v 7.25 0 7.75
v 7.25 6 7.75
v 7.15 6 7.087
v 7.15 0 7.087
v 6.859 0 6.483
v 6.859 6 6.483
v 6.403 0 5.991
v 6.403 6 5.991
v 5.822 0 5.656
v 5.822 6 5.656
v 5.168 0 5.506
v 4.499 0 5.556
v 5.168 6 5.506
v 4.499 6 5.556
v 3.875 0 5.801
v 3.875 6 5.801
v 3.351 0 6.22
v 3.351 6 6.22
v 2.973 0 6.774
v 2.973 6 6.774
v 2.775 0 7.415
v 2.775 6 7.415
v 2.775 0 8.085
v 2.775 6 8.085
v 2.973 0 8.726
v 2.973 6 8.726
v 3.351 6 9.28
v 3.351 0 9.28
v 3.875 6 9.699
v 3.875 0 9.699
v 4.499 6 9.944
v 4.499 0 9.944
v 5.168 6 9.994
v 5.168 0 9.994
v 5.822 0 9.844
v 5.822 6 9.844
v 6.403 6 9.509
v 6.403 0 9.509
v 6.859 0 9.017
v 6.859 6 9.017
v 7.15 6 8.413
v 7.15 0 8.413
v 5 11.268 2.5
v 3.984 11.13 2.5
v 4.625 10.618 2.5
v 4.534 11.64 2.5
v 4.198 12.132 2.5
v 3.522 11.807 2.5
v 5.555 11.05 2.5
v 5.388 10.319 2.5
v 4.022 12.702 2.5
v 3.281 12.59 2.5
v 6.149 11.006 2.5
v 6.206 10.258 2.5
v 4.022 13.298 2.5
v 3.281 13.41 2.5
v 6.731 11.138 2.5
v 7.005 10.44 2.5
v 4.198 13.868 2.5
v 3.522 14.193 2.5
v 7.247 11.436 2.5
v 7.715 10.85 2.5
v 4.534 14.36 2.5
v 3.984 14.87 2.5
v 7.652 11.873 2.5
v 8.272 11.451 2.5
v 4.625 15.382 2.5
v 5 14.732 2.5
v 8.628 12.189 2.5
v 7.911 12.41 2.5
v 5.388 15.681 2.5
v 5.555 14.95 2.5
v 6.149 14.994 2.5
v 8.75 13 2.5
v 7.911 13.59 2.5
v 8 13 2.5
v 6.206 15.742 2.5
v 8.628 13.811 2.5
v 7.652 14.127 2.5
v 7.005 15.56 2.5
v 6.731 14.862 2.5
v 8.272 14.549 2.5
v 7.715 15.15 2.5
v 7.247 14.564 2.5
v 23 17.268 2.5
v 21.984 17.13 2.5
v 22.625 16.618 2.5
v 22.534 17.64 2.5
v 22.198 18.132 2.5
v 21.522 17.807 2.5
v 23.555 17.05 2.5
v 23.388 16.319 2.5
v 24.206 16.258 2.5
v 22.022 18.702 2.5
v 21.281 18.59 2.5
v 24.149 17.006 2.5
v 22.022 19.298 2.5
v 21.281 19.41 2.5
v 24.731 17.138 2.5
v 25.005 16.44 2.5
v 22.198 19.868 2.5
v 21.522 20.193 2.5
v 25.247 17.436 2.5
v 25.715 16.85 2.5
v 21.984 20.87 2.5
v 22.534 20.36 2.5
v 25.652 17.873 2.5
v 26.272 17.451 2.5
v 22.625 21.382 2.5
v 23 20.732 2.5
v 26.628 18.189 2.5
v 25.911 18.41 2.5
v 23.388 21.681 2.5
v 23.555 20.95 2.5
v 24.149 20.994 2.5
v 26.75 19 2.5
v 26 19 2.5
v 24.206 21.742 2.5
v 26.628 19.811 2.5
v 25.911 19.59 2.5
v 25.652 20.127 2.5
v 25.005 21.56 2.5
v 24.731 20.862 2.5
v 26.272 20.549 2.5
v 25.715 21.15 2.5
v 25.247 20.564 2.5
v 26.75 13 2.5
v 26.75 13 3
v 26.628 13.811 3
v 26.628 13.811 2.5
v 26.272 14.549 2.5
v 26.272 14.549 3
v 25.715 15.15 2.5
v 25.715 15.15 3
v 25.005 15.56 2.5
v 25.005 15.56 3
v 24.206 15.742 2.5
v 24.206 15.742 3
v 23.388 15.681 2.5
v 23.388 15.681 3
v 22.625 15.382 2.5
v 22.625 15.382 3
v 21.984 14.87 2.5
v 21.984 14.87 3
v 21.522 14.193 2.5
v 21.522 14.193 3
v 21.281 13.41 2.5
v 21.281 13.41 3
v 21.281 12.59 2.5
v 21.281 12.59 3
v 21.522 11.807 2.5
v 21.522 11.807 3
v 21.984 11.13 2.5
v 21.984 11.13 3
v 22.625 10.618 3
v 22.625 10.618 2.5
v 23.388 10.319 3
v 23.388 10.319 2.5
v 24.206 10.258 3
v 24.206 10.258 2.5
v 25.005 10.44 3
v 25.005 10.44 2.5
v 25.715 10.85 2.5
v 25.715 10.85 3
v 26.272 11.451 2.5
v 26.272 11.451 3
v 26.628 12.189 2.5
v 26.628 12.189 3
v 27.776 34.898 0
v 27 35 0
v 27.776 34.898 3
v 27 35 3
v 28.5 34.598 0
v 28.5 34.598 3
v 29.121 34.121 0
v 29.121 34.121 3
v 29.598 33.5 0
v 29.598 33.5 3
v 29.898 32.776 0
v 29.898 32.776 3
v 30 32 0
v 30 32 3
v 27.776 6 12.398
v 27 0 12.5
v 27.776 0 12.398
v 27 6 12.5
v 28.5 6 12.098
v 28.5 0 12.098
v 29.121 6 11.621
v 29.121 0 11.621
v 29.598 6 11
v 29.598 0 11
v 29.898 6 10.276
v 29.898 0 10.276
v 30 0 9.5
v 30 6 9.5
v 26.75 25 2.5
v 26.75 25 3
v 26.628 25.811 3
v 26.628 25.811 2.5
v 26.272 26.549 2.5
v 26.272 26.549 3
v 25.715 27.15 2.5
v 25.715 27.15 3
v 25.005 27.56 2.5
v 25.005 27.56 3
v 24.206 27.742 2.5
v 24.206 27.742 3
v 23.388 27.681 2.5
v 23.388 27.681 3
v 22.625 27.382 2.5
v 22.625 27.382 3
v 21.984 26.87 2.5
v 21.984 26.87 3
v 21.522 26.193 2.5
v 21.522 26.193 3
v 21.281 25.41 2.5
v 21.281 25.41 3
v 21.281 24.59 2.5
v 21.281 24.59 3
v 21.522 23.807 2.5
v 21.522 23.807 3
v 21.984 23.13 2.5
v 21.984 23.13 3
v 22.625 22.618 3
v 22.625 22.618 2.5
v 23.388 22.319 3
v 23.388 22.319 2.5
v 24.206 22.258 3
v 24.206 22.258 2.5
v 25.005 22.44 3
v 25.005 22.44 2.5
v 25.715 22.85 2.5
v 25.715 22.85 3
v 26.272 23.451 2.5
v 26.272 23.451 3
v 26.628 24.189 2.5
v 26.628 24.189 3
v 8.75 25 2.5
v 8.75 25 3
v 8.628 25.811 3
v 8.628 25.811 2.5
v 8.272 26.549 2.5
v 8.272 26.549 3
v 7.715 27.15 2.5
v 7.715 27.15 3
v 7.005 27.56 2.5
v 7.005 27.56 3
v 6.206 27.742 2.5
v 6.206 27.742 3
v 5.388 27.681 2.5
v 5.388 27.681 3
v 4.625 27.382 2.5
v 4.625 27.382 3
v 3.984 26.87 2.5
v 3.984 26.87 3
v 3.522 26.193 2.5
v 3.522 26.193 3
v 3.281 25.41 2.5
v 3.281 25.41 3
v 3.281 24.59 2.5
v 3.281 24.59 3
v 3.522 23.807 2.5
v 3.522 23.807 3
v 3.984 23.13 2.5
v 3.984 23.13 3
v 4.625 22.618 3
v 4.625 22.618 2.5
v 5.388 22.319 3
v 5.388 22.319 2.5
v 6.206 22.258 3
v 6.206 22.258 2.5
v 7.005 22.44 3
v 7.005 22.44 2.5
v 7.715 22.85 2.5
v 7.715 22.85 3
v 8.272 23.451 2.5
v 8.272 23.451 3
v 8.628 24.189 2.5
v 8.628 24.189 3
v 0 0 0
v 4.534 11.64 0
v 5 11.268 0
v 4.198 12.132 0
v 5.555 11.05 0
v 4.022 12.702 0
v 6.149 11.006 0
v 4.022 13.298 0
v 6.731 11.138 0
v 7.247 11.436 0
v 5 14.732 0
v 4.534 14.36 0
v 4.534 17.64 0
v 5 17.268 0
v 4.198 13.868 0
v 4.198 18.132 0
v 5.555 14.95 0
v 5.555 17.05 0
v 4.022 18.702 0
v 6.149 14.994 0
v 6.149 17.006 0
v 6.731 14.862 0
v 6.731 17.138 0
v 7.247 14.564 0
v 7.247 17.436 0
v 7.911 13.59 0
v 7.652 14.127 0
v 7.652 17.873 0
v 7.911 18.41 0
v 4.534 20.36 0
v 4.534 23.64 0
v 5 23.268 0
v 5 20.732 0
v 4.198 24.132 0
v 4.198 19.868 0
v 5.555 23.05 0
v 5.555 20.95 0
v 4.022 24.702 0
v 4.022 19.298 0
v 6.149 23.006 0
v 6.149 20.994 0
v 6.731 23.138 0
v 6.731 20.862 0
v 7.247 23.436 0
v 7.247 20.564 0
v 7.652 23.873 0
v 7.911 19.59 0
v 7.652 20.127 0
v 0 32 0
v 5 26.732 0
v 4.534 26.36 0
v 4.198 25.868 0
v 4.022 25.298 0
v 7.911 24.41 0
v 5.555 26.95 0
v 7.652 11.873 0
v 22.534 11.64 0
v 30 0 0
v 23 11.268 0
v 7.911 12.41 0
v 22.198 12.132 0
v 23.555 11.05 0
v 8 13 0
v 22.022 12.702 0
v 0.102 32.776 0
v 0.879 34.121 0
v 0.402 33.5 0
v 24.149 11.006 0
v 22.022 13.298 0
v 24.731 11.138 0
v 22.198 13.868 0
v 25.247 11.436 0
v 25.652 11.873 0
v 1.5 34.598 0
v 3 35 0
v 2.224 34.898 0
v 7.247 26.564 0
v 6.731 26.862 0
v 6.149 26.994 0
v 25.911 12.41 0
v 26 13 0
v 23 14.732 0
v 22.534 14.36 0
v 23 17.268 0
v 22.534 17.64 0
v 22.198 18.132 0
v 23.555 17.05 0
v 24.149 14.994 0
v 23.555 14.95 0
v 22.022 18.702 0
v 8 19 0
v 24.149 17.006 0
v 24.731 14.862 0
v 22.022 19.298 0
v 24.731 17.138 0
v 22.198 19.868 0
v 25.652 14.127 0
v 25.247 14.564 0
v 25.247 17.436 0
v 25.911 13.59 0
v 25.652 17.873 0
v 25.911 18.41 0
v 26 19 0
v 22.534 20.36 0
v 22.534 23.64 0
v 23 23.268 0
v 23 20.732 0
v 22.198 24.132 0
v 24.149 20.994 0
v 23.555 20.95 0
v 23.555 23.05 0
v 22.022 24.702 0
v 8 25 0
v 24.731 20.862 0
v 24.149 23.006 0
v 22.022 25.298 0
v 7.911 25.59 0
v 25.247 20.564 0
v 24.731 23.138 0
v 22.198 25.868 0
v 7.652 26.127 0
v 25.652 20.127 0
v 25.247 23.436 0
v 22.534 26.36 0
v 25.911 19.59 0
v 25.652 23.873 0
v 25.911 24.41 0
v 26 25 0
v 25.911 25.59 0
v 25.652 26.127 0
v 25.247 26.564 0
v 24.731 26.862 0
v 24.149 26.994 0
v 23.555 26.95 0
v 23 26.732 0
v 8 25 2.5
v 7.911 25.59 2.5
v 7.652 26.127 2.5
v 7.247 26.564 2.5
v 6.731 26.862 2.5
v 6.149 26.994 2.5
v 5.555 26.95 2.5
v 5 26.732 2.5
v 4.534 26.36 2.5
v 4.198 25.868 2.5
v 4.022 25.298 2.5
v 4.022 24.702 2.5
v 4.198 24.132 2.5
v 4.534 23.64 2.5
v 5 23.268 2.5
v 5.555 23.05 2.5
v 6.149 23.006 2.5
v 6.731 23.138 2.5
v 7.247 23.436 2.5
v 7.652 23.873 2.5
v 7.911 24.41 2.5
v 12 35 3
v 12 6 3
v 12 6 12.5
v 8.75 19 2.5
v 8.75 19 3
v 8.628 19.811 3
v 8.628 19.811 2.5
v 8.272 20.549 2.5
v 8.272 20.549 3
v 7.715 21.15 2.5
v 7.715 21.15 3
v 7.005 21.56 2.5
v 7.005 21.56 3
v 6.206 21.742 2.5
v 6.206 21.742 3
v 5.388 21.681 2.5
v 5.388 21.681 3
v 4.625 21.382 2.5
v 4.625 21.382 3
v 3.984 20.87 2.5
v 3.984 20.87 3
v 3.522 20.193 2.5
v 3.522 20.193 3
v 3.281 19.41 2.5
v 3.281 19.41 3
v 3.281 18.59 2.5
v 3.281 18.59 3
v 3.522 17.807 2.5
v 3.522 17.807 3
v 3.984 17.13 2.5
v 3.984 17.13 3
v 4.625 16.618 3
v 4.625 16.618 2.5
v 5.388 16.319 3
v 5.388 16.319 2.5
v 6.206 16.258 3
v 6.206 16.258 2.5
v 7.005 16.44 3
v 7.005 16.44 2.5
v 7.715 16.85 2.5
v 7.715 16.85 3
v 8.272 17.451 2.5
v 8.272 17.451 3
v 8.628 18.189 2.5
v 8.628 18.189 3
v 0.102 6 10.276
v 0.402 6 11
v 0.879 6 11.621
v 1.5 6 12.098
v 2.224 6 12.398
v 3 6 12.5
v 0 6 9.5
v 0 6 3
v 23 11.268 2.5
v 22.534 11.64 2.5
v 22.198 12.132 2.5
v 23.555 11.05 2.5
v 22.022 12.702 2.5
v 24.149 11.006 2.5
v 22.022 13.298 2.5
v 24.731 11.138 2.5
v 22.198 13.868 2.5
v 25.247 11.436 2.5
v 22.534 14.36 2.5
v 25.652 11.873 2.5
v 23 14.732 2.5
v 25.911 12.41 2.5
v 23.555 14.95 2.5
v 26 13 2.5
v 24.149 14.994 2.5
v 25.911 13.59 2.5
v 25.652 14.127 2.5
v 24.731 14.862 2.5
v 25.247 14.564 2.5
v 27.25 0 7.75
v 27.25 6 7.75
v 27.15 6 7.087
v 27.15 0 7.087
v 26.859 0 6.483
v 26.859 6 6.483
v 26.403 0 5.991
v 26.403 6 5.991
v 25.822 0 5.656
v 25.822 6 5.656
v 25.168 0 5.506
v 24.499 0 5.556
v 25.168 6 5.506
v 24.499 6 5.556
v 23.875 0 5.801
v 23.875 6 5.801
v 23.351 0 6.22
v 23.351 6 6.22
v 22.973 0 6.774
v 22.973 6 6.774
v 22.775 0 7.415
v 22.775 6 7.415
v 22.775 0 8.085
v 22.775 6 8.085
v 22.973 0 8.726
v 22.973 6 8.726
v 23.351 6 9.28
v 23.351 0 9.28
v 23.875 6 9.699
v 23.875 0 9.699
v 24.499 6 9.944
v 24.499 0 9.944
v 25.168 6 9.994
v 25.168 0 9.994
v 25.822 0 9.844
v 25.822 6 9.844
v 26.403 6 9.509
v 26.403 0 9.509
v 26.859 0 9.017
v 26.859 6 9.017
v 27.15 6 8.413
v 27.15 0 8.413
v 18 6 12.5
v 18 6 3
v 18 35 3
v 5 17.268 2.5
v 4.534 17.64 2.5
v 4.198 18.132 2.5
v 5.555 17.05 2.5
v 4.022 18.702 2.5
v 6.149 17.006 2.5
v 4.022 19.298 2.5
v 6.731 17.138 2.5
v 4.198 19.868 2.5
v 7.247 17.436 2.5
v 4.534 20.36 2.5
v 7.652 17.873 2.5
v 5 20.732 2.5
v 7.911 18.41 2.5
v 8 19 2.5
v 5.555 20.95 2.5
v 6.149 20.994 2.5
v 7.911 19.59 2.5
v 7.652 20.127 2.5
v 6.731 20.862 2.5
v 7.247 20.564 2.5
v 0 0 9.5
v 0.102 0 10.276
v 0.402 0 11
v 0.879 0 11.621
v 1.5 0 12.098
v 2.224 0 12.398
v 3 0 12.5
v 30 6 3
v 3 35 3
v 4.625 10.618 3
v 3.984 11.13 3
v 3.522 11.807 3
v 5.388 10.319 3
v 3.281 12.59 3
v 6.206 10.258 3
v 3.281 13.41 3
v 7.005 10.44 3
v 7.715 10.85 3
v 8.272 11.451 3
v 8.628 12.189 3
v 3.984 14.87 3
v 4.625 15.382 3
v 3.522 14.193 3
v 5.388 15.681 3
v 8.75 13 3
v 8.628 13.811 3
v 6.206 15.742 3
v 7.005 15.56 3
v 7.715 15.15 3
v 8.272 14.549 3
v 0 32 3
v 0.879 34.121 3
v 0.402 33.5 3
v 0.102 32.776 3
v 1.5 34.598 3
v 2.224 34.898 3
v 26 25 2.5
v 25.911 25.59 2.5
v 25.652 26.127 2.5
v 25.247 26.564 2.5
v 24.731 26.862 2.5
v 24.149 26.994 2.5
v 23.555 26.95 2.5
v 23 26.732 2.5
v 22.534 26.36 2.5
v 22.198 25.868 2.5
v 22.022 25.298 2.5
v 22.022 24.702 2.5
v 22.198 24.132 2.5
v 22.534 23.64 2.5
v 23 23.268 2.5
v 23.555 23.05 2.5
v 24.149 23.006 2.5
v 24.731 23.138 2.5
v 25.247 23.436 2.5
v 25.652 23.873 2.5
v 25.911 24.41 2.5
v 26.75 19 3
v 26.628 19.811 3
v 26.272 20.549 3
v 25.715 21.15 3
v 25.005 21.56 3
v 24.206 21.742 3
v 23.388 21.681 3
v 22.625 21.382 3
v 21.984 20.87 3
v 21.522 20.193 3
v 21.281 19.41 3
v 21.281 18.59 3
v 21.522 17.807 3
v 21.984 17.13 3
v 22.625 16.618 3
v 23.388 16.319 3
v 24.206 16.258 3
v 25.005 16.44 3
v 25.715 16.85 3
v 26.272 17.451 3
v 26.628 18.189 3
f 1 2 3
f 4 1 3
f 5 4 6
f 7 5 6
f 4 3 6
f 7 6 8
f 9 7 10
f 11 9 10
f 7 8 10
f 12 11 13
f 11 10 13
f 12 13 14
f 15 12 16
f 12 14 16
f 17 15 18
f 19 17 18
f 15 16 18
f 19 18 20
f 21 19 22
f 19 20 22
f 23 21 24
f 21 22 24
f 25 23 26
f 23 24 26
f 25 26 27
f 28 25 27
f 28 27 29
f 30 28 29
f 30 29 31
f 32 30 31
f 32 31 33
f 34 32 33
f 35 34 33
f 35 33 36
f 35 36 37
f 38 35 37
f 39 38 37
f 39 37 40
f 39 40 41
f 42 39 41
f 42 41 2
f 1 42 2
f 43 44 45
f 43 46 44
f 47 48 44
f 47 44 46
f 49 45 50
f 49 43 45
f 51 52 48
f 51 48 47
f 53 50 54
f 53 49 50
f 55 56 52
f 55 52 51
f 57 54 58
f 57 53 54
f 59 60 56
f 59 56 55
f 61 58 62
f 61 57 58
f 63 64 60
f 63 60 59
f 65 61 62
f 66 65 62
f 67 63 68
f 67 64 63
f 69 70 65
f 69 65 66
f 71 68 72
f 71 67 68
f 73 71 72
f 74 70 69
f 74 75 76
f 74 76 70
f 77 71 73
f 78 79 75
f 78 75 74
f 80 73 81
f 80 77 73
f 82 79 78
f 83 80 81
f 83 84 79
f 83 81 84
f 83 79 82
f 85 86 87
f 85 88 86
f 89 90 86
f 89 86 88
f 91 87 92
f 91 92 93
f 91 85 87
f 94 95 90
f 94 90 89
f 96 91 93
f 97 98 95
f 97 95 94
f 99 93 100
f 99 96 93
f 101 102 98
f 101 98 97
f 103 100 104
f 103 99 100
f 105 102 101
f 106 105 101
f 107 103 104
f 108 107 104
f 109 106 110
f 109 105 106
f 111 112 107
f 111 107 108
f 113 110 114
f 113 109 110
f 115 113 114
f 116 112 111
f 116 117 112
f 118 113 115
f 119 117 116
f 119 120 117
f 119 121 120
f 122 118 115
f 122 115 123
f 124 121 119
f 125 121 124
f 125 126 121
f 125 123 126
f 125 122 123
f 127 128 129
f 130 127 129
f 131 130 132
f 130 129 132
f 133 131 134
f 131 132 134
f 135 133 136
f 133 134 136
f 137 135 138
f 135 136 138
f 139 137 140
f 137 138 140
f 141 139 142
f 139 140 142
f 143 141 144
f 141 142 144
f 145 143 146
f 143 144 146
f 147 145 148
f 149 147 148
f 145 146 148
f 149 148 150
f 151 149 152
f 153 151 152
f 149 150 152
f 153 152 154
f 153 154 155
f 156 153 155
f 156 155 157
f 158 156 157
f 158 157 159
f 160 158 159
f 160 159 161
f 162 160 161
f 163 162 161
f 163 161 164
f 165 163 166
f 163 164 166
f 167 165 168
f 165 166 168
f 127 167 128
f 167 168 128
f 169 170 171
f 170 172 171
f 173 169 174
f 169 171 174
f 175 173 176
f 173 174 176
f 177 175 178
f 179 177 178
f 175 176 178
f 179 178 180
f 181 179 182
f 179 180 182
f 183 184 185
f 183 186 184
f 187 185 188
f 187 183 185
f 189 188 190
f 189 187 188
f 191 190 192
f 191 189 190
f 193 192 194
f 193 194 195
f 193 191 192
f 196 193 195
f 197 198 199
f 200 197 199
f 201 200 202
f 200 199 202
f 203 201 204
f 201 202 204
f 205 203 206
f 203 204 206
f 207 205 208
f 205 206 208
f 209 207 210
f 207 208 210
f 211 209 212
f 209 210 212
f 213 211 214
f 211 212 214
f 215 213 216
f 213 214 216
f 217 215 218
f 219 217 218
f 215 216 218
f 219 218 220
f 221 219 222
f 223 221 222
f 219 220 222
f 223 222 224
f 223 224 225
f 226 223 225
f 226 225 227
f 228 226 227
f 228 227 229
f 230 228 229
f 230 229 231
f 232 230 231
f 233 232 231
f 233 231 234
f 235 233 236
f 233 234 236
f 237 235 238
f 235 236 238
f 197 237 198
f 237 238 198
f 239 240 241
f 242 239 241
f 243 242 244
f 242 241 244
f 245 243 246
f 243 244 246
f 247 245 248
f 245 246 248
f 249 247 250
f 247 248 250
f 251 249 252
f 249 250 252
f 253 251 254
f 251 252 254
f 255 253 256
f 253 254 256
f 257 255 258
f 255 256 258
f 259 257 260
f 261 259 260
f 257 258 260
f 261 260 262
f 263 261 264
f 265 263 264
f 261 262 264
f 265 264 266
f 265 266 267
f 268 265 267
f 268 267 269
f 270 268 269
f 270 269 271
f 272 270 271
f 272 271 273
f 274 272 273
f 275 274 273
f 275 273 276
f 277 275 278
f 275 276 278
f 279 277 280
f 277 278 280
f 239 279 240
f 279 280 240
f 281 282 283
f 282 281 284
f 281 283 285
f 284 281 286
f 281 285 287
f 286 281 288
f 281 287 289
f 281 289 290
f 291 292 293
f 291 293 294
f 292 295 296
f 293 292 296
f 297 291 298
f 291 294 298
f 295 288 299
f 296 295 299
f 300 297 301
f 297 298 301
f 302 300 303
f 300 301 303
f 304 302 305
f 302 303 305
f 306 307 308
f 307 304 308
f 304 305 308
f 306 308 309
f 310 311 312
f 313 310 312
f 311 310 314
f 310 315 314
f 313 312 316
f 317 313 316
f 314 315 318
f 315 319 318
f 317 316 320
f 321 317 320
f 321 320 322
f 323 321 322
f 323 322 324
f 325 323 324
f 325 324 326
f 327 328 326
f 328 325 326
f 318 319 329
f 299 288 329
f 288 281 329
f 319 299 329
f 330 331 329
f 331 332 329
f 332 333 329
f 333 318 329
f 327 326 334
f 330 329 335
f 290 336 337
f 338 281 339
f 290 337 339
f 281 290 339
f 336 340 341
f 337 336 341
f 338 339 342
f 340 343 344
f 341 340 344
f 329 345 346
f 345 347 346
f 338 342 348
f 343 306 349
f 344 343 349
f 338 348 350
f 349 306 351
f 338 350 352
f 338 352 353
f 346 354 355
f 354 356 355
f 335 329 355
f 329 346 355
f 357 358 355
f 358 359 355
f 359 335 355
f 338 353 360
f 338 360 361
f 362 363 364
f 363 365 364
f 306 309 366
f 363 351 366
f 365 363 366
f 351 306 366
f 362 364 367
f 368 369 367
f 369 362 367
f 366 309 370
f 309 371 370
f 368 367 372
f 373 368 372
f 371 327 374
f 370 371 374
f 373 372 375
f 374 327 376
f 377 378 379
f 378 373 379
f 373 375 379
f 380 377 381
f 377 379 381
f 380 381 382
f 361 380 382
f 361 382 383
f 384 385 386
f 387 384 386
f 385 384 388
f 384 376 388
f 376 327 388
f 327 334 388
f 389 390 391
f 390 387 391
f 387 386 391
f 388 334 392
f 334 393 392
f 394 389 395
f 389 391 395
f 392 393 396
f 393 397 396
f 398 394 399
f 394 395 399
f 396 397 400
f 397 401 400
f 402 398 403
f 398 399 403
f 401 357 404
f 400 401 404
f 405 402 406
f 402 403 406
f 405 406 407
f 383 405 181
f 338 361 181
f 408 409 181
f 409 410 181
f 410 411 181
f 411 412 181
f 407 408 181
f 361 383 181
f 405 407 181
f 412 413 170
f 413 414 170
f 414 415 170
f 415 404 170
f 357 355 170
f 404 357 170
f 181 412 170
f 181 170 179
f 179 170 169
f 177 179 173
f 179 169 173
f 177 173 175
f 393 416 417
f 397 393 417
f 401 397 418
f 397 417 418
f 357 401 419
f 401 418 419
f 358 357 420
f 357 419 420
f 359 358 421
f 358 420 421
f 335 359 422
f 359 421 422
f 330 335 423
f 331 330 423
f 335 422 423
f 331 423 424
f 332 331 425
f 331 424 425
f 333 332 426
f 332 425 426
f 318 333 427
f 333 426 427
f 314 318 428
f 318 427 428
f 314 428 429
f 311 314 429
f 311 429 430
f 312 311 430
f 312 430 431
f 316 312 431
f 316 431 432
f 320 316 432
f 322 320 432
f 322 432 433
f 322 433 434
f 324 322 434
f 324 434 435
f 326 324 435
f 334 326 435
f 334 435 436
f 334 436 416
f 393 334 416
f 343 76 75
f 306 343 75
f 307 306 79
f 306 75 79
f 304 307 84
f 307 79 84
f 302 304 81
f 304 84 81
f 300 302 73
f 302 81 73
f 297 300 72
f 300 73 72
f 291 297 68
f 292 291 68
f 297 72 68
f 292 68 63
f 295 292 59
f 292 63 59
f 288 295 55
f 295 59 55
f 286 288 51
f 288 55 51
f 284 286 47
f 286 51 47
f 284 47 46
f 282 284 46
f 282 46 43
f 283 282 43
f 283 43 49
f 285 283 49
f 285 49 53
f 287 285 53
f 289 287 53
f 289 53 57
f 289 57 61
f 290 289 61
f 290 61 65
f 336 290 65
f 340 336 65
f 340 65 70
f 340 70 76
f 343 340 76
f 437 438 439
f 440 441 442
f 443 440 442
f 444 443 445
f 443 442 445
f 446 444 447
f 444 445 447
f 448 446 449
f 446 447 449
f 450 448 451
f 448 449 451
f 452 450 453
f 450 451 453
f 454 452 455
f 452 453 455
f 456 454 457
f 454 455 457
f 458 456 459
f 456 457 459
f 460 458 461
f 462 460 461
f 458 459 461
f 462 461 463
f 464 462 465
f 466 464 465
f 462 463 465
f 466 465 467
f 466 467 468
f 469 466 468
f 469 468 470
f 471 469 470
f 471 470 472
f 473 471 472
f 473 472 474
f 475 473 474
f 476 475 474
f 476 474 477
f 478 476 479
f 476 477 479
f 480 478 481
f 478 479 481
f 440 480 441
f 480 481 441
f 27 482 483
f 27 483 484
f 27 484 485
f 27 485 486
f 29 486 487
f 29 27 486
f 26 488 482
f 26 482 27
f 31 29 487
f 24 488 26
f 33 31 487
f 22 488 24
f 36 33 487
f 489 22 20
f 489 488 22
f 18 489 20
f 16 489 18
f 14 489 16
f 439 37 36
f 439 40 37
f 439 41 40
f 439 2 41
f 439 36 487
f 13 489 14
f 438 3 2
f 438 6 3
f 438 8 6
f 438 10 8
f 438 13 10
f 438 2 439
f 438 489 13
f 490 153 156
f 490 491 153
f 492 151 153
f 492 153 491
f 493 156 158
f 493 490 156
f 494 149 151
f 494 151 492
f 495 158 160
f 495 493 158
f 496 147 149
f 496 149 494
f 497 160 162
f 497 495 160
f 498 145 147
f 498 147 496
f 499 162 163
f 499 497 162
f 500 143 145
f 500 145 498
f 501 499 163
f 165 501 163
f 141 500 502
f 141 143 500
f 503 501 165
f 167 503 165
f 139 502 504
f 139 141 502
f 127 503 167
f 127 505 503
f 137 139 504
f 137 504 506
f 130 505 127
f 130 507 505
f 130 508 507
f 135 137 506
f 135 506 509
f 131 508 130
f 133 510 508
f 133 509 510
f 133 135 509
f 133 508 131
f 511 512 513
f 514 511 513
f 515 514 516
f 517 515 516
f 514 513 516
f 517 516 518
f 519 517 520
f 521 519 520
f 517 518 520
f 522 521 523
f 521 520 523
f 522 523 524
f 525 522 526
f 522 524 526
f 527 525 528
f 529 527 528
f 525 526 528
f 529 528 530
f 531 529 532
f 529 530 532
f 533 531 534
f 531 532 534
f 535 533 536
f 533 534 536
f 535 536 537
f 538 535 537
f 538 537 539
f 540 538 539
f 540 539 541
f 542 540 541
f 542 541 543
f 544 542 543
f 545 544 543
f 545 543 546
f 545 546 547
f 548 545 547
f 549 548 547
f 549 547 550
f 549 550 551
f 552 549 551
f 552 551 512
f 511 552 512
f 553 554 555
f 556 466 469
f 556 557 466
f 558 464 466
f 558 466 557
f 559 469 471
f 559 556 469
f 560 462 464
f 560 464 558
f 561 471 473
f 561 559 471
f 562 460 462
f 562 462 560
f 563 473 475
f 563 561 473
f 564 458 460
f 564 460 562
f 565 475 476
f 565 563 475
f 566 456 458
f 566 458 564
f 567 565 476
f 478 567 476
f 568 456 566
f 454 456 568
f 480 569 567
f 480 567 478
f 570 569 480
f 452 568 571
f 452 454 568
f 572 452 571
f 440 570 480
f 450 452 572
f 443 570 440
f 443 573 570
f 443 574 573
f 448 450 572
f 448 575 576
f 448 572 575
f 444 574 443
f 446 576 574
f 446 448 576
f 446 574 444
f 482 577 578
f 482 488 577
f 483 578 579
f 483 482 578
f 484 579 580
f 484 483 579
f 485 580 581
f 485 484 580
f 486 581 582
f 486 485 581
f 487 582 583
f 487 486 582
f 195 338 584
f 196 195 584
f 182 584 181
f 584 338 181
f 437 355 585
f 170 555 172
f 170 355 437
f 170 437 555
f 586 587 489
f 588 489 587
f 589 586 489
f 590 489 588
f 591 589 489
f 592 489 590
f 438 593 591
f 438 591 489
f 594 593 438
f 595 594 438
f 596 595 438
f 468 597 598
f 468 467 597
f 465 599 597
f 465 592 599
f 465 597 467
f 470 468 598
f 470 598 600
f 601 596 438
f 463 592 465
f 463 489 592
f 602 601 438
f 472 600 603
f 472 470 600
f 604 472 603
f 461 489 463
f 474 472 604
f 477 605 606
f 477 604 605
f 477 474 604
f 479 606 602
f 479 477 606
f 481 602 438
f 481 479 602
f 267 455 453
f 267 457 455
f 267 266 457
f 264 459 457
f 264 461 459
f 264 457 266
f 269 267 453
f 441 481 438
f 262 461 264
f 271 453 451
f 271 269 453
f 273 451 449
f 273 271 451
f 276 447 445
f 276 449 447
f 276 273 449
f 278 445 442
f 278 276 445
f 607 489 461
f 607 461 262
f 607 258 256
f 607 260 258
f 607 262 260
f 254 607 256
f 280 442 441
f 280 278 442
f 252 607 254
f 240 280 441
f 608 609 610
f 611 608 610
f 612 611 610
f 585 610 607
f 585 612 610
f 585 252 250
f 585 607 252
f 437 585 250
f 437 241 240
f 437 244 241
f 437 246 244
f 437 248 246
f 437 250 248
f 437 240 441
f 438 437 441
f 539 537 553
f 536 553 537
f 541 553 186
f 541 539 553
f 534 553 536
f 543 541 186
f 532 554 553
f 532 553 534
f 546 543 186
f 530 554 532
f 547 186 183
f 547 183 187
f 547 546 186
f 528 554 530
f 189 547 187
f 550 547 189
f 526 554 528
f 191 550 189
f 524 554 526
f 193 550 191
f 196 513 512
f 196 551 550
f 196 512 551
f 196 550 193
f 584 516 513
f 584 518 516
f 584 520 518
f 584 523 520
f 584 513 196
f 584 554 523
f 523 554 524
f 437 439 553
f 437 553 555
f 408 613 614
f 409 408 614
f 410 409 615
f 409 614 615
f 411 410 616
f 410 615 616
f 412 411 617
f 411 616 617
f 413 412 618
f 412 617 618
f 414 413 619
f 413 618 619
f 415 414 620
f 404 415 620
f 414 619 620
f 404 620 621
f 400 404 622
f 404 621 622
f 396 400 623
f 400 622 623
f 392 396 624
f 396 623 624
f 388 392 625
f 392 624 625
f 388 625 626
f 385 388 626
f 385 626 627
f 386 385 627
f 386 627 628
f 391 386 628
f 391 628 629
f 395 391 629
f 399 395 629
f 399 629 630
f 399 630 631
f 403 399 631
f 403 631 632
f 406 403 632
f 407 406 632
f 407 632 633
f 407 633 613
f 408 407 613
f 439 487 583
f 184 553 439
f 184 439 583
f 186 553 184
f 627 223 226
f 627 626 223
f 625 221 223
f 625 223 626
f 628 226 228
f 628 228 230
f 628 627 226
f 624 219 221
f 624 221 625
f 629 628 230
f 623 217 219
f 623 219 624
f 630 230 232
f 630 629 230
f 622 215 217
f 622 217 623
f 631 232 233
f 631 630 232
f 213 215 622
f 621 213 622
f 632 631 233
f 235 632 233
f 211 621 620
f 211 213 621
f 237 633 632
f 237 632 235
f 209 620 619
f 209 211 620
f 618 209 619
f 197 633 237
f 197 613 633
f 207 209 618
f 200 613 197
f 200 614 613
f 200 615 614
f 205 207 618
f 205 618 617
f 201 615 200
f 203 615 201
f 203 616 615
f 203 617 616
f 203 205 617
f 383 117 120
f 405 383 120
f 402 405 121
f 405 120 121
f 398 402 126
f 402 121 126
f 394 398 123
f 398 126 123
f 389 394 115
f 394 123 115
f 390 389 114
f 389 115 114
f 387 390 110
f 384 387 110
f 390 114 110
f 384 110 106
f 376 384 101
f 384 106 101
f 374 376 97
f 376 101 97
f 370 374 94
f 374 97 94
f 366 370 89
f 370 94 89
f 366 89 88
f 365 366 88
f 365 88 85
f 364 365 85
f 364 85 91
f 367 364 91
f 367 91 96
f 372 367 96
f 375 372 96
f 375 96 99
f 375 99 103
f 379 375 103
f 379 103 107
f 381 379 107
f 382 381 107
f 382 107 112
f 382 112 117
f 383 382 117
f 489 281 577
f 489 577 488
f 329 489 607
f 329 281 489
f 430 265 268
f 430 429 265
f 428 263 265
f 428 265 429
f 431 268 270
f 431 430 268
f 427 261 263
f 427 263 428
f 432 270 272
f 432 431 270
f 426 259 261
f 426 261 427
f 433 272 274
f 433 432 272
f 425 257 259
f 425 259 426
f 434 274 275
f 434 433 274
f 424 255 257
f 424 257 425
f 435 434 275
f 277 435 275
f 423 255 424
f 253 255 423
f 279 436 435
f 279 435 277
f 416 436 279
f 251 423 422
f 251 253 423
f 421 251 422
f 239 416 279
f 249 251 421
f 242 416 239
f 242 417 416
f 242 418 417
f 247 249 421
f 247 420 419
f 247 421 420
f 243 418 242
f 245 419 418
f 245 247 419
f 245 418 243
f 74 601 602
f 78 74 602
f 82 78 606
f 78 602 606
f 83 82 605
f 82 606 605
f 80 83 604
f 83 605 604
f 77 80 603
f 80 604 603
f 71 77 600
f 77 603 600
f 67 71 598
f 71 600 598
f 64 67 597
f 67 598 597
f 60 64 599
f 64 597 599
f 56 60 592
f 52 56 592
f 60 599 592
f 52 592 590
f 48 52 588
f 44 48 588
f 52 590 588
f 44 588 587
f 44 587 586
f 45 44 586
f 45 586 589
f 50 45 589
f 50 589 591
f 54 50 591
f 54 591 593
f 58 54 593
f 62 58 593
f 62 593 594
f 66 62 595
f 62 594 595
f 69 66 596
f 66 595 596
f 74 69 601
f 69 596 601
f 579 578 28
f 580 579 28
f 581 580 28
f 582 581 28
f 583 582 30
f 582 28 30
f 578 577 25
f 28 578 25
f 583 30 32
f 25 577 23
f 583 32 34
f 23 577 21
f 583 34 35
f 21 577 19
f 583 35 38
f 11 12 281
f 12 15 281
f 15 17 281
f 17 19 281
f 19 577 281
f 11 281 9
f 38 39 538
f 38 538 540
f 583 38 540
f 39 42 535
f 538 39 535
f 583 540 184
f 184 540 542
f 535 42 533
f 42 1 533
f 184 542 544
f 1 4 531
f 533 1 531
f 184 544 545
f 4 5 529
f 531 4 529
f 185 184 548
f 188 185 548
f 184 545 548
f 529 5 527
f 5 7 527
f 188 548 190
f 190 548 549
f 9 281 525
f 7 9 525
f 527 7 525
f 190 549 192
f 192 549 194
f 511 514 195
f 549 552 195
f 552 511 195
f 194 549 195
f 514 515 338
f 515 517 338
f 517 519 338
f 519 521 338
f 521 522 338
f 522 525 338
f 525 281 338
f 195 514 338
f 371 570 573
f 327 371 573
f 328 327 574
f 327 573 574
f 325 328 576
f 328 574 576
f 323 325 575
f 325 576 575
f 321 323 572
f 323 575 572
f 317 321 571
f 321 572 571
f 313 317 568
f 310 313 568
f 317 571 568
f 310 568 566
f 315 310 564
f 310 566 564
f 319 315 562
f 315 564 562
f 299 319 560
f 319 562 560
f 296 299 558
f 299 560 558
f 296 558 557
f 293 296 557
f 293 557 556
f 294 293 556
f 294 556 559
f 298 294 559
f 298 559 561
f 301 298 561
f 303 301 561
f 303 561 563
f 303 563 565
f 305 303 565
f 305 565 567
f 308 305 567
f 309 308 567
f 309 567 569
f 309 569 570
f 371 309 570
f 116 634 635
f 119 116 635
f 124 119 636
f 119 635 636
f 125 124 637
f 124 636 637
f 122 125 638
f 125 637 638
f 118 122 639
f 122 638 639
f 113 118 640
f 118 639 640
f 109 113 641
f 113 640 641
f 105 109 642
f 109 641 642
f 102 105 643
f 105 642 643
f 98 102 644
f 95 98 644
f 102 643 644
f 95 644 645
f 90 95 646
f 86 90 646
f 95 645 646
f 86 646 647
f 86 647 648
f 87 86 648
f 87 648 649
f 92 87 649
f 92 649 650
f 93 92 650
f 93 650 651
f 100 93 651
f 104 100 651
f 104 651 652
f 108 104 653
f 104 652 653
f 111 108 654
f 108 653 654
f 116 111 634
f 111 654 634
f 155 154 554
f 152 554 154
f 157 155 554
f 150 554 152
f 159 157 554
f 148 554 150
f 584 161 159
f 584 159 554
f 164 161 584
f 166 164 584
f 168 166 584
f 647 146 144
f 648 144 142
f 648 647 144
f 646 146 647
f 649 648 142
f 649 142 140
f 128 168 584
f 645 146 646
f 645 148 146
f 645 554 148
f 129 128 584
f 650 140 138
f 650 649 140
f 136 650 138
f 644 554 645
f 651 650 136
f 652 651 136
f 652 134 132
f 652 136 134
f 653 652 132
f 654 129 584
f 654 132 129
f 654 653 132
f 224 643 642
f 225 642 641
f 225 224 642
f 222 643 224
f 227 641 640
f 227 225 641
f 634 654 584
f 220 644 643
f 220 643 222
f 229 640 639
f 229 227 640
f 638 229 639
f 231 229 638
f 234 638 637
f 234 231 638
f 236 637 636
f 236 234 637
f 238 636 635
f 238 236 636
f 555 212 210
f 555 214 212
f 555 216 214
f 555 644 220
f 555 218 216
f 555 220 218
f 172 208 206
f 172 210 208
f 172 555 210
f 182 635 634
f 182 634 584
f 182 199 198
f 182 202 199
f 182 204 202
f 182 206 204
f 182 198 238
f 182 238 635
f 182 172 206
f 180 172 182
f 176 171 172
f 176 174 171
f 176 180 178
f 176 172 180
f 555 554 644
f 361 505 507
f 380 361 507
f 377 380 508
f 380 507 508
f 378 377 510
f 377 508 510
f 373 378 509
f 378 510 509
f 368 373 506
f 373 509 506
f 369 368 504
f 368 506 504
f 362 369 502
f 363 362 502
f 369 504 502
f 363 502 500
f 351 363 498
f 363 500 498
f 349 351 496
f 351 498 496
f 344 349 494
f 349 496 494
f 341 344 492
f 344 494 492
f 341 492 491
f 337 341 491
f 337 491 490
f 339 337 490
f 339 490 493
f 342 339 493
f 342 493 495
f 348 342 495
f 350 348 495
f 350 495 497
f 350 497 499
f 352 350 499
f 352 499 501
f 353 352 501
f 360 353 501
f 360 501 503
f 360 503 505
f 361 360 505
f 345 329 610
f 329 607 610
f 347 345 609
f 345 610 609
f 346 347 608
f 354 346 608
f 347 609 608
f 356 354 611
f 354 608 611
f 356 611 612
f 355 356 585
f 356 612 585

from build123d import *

# Parameters (mm, degrees)
ESQUISSE1_W                  = 30
ESQUISSE1_H                  = 35
BOSS_EXTRU_1_DEPTH           = 3
ESQUISSE2_R                  = 2
ENL_V_MAT_EXTRU_1_DEPTH      = 1
ENL_V_MAT_EXTRU_1_DEPTH_BACK = 4
ESQUISSE3_W                  = 30
ESQUISSE3_H                  = 6
BOSS_EXTRU_2_DEPTH           = 9.5
ESQUISSE4_R                  = 2.25
ENL_V_MAT_EXTRU_2_DEPTH      = 30
ENL_V_MAT_EXTRU_2_DEPTH_BACK = 7
BOSS_EXTRU_3_START           = -18
BOSS_EXTRU_3_DEPTH           = 6
CONG_1_R                     = 3
ESQUISSE6_R                  = 2.75
ENL_V_MAT_EXTRU_3_DEPTH      = 0.5


with BuildPart() as part:
    # Esquisse1 → Boss.-Extru.1 (new body)
    with BuildSketch(Plane.XY):
        with Locations((15, 17.5)):
            Rectangle(ESQUISSE1_W, ESQUISSE1_H)
    extrude(amount=BOSS_EXTRU_1_DEPTH)

    # Esquisse2 → Enlèv. mat.-Extru.1 (cut, two sides)
    with BuildSketch(Plane.XY.offset(3)) as enl_v_mat_extru_1_sk:
        with Locations((6, 25)):
            Circle(ESQUISSE2_R)
        with Locations((24, 25)):
            Circle(ESQUISSE2_R)
        with Locations((24, 13)):
            Circle(ESQUISSE2_R)
        with Locations((6, 13)):
            Circle(ESQUISSE2_R)
        with Locations((6, 19)):
            Circle(ESQUISSE2_R)
        with Locations((24, 19)):
            Circle(ESQUISSE2_R)
    extrude(amount=ENL_V_MAT_EXTRU_1_DEPTH, mode=Mode.SUBTRACT)
    extrude(enl_v_mat_extru_1_sk.sketch, amount=-ENL_V_MAT_EXTRU_1_DEPTH_BACK, mode=Mode.SUBTRACT)

    # Esquisse3 → Boss.-Extru.2 (add)
    with BuildSketch(Plane.XY.offset(3)):
        with Locations((15, 3)):
            Rectangle(ESQUISSE3_W, ESQUISSE3_H)
    extrude(amount=BOSS_EXTRU_2_DEPTH)

    # Esquisse4 → Enlèv. mat.-Extru.2 (cut, two sides)
    with BuildSketch(Plane(origin=(0, 6, 0), x_dir=(1, 0, 0), z_dir=(0, 1, 0))) as enl_v_mat_extru_2_sk:
        with Locations((25, -7.75)):
            Circle(ESQUISSE4_R)
        with Locations((5, -7.75)):
            Circle(ESQUISSE4_R)
    extrude(amount=ENL_V_MAT_EXTRU_2_DEPTH, mode=Mode.SUBTRACT)
    extrude(enl_v_mat_extru_2_sk.sketch, amount=-ENL_V_MAT_EXTRU_2_DEPTH_BACK, mode=Mode.SUBTRACT)

    # Esquisse5 → Boss.-Extru.3 (add)
    with BuildSketch(Plane(origin=(30, 0, 0), x_dir=(0, 0, -1), z_dir=(1, 0, 0)).offset(BOSS_EXTRU_3_START)):
        Polygon((-12.5, 6), (-3, 35), (-3, 6), align=None)
    extrude(amount=BOSS_EXTRU_3_DEPTH)

    # Congé1
    cong_1_edges = [part.edges().sort_by_distance(p)[0] for p in [
        (0, 3, 12.5),
        (30, 3, 12.5),
        (0, 35, 1.5),
        (30, 35, 1.5),
    ]]
    fillet(cong_1_edges, radius=CONG_1_R)

    # Esquisse6 → Enlèv. mat.-Extru.3 (cut)
    with BuildSketch(Plane.XY.offset(3)):
        with Locations((24, 25)):
            Circle(ESQUISSE6_R)
        with Locations((24, 19)):
            Circle(ESQUISSE6_R)
        with Locations((24, 13)):
            Circle(ESQUISSE6_R)
        with Locations((6, 13)):
            Circle(ESQUISSE6_R)
        with Locations((6, 19)):
            Circle(ESQUISSE6_R)
        with Locations((6, 25)):
            Circle(ESQUISSE6_R)
    extrude(amount=-ENL_V_MAT_EXTRU_3_DEPTH, mode=Mode.SUBTRACT)


solid = part.part
